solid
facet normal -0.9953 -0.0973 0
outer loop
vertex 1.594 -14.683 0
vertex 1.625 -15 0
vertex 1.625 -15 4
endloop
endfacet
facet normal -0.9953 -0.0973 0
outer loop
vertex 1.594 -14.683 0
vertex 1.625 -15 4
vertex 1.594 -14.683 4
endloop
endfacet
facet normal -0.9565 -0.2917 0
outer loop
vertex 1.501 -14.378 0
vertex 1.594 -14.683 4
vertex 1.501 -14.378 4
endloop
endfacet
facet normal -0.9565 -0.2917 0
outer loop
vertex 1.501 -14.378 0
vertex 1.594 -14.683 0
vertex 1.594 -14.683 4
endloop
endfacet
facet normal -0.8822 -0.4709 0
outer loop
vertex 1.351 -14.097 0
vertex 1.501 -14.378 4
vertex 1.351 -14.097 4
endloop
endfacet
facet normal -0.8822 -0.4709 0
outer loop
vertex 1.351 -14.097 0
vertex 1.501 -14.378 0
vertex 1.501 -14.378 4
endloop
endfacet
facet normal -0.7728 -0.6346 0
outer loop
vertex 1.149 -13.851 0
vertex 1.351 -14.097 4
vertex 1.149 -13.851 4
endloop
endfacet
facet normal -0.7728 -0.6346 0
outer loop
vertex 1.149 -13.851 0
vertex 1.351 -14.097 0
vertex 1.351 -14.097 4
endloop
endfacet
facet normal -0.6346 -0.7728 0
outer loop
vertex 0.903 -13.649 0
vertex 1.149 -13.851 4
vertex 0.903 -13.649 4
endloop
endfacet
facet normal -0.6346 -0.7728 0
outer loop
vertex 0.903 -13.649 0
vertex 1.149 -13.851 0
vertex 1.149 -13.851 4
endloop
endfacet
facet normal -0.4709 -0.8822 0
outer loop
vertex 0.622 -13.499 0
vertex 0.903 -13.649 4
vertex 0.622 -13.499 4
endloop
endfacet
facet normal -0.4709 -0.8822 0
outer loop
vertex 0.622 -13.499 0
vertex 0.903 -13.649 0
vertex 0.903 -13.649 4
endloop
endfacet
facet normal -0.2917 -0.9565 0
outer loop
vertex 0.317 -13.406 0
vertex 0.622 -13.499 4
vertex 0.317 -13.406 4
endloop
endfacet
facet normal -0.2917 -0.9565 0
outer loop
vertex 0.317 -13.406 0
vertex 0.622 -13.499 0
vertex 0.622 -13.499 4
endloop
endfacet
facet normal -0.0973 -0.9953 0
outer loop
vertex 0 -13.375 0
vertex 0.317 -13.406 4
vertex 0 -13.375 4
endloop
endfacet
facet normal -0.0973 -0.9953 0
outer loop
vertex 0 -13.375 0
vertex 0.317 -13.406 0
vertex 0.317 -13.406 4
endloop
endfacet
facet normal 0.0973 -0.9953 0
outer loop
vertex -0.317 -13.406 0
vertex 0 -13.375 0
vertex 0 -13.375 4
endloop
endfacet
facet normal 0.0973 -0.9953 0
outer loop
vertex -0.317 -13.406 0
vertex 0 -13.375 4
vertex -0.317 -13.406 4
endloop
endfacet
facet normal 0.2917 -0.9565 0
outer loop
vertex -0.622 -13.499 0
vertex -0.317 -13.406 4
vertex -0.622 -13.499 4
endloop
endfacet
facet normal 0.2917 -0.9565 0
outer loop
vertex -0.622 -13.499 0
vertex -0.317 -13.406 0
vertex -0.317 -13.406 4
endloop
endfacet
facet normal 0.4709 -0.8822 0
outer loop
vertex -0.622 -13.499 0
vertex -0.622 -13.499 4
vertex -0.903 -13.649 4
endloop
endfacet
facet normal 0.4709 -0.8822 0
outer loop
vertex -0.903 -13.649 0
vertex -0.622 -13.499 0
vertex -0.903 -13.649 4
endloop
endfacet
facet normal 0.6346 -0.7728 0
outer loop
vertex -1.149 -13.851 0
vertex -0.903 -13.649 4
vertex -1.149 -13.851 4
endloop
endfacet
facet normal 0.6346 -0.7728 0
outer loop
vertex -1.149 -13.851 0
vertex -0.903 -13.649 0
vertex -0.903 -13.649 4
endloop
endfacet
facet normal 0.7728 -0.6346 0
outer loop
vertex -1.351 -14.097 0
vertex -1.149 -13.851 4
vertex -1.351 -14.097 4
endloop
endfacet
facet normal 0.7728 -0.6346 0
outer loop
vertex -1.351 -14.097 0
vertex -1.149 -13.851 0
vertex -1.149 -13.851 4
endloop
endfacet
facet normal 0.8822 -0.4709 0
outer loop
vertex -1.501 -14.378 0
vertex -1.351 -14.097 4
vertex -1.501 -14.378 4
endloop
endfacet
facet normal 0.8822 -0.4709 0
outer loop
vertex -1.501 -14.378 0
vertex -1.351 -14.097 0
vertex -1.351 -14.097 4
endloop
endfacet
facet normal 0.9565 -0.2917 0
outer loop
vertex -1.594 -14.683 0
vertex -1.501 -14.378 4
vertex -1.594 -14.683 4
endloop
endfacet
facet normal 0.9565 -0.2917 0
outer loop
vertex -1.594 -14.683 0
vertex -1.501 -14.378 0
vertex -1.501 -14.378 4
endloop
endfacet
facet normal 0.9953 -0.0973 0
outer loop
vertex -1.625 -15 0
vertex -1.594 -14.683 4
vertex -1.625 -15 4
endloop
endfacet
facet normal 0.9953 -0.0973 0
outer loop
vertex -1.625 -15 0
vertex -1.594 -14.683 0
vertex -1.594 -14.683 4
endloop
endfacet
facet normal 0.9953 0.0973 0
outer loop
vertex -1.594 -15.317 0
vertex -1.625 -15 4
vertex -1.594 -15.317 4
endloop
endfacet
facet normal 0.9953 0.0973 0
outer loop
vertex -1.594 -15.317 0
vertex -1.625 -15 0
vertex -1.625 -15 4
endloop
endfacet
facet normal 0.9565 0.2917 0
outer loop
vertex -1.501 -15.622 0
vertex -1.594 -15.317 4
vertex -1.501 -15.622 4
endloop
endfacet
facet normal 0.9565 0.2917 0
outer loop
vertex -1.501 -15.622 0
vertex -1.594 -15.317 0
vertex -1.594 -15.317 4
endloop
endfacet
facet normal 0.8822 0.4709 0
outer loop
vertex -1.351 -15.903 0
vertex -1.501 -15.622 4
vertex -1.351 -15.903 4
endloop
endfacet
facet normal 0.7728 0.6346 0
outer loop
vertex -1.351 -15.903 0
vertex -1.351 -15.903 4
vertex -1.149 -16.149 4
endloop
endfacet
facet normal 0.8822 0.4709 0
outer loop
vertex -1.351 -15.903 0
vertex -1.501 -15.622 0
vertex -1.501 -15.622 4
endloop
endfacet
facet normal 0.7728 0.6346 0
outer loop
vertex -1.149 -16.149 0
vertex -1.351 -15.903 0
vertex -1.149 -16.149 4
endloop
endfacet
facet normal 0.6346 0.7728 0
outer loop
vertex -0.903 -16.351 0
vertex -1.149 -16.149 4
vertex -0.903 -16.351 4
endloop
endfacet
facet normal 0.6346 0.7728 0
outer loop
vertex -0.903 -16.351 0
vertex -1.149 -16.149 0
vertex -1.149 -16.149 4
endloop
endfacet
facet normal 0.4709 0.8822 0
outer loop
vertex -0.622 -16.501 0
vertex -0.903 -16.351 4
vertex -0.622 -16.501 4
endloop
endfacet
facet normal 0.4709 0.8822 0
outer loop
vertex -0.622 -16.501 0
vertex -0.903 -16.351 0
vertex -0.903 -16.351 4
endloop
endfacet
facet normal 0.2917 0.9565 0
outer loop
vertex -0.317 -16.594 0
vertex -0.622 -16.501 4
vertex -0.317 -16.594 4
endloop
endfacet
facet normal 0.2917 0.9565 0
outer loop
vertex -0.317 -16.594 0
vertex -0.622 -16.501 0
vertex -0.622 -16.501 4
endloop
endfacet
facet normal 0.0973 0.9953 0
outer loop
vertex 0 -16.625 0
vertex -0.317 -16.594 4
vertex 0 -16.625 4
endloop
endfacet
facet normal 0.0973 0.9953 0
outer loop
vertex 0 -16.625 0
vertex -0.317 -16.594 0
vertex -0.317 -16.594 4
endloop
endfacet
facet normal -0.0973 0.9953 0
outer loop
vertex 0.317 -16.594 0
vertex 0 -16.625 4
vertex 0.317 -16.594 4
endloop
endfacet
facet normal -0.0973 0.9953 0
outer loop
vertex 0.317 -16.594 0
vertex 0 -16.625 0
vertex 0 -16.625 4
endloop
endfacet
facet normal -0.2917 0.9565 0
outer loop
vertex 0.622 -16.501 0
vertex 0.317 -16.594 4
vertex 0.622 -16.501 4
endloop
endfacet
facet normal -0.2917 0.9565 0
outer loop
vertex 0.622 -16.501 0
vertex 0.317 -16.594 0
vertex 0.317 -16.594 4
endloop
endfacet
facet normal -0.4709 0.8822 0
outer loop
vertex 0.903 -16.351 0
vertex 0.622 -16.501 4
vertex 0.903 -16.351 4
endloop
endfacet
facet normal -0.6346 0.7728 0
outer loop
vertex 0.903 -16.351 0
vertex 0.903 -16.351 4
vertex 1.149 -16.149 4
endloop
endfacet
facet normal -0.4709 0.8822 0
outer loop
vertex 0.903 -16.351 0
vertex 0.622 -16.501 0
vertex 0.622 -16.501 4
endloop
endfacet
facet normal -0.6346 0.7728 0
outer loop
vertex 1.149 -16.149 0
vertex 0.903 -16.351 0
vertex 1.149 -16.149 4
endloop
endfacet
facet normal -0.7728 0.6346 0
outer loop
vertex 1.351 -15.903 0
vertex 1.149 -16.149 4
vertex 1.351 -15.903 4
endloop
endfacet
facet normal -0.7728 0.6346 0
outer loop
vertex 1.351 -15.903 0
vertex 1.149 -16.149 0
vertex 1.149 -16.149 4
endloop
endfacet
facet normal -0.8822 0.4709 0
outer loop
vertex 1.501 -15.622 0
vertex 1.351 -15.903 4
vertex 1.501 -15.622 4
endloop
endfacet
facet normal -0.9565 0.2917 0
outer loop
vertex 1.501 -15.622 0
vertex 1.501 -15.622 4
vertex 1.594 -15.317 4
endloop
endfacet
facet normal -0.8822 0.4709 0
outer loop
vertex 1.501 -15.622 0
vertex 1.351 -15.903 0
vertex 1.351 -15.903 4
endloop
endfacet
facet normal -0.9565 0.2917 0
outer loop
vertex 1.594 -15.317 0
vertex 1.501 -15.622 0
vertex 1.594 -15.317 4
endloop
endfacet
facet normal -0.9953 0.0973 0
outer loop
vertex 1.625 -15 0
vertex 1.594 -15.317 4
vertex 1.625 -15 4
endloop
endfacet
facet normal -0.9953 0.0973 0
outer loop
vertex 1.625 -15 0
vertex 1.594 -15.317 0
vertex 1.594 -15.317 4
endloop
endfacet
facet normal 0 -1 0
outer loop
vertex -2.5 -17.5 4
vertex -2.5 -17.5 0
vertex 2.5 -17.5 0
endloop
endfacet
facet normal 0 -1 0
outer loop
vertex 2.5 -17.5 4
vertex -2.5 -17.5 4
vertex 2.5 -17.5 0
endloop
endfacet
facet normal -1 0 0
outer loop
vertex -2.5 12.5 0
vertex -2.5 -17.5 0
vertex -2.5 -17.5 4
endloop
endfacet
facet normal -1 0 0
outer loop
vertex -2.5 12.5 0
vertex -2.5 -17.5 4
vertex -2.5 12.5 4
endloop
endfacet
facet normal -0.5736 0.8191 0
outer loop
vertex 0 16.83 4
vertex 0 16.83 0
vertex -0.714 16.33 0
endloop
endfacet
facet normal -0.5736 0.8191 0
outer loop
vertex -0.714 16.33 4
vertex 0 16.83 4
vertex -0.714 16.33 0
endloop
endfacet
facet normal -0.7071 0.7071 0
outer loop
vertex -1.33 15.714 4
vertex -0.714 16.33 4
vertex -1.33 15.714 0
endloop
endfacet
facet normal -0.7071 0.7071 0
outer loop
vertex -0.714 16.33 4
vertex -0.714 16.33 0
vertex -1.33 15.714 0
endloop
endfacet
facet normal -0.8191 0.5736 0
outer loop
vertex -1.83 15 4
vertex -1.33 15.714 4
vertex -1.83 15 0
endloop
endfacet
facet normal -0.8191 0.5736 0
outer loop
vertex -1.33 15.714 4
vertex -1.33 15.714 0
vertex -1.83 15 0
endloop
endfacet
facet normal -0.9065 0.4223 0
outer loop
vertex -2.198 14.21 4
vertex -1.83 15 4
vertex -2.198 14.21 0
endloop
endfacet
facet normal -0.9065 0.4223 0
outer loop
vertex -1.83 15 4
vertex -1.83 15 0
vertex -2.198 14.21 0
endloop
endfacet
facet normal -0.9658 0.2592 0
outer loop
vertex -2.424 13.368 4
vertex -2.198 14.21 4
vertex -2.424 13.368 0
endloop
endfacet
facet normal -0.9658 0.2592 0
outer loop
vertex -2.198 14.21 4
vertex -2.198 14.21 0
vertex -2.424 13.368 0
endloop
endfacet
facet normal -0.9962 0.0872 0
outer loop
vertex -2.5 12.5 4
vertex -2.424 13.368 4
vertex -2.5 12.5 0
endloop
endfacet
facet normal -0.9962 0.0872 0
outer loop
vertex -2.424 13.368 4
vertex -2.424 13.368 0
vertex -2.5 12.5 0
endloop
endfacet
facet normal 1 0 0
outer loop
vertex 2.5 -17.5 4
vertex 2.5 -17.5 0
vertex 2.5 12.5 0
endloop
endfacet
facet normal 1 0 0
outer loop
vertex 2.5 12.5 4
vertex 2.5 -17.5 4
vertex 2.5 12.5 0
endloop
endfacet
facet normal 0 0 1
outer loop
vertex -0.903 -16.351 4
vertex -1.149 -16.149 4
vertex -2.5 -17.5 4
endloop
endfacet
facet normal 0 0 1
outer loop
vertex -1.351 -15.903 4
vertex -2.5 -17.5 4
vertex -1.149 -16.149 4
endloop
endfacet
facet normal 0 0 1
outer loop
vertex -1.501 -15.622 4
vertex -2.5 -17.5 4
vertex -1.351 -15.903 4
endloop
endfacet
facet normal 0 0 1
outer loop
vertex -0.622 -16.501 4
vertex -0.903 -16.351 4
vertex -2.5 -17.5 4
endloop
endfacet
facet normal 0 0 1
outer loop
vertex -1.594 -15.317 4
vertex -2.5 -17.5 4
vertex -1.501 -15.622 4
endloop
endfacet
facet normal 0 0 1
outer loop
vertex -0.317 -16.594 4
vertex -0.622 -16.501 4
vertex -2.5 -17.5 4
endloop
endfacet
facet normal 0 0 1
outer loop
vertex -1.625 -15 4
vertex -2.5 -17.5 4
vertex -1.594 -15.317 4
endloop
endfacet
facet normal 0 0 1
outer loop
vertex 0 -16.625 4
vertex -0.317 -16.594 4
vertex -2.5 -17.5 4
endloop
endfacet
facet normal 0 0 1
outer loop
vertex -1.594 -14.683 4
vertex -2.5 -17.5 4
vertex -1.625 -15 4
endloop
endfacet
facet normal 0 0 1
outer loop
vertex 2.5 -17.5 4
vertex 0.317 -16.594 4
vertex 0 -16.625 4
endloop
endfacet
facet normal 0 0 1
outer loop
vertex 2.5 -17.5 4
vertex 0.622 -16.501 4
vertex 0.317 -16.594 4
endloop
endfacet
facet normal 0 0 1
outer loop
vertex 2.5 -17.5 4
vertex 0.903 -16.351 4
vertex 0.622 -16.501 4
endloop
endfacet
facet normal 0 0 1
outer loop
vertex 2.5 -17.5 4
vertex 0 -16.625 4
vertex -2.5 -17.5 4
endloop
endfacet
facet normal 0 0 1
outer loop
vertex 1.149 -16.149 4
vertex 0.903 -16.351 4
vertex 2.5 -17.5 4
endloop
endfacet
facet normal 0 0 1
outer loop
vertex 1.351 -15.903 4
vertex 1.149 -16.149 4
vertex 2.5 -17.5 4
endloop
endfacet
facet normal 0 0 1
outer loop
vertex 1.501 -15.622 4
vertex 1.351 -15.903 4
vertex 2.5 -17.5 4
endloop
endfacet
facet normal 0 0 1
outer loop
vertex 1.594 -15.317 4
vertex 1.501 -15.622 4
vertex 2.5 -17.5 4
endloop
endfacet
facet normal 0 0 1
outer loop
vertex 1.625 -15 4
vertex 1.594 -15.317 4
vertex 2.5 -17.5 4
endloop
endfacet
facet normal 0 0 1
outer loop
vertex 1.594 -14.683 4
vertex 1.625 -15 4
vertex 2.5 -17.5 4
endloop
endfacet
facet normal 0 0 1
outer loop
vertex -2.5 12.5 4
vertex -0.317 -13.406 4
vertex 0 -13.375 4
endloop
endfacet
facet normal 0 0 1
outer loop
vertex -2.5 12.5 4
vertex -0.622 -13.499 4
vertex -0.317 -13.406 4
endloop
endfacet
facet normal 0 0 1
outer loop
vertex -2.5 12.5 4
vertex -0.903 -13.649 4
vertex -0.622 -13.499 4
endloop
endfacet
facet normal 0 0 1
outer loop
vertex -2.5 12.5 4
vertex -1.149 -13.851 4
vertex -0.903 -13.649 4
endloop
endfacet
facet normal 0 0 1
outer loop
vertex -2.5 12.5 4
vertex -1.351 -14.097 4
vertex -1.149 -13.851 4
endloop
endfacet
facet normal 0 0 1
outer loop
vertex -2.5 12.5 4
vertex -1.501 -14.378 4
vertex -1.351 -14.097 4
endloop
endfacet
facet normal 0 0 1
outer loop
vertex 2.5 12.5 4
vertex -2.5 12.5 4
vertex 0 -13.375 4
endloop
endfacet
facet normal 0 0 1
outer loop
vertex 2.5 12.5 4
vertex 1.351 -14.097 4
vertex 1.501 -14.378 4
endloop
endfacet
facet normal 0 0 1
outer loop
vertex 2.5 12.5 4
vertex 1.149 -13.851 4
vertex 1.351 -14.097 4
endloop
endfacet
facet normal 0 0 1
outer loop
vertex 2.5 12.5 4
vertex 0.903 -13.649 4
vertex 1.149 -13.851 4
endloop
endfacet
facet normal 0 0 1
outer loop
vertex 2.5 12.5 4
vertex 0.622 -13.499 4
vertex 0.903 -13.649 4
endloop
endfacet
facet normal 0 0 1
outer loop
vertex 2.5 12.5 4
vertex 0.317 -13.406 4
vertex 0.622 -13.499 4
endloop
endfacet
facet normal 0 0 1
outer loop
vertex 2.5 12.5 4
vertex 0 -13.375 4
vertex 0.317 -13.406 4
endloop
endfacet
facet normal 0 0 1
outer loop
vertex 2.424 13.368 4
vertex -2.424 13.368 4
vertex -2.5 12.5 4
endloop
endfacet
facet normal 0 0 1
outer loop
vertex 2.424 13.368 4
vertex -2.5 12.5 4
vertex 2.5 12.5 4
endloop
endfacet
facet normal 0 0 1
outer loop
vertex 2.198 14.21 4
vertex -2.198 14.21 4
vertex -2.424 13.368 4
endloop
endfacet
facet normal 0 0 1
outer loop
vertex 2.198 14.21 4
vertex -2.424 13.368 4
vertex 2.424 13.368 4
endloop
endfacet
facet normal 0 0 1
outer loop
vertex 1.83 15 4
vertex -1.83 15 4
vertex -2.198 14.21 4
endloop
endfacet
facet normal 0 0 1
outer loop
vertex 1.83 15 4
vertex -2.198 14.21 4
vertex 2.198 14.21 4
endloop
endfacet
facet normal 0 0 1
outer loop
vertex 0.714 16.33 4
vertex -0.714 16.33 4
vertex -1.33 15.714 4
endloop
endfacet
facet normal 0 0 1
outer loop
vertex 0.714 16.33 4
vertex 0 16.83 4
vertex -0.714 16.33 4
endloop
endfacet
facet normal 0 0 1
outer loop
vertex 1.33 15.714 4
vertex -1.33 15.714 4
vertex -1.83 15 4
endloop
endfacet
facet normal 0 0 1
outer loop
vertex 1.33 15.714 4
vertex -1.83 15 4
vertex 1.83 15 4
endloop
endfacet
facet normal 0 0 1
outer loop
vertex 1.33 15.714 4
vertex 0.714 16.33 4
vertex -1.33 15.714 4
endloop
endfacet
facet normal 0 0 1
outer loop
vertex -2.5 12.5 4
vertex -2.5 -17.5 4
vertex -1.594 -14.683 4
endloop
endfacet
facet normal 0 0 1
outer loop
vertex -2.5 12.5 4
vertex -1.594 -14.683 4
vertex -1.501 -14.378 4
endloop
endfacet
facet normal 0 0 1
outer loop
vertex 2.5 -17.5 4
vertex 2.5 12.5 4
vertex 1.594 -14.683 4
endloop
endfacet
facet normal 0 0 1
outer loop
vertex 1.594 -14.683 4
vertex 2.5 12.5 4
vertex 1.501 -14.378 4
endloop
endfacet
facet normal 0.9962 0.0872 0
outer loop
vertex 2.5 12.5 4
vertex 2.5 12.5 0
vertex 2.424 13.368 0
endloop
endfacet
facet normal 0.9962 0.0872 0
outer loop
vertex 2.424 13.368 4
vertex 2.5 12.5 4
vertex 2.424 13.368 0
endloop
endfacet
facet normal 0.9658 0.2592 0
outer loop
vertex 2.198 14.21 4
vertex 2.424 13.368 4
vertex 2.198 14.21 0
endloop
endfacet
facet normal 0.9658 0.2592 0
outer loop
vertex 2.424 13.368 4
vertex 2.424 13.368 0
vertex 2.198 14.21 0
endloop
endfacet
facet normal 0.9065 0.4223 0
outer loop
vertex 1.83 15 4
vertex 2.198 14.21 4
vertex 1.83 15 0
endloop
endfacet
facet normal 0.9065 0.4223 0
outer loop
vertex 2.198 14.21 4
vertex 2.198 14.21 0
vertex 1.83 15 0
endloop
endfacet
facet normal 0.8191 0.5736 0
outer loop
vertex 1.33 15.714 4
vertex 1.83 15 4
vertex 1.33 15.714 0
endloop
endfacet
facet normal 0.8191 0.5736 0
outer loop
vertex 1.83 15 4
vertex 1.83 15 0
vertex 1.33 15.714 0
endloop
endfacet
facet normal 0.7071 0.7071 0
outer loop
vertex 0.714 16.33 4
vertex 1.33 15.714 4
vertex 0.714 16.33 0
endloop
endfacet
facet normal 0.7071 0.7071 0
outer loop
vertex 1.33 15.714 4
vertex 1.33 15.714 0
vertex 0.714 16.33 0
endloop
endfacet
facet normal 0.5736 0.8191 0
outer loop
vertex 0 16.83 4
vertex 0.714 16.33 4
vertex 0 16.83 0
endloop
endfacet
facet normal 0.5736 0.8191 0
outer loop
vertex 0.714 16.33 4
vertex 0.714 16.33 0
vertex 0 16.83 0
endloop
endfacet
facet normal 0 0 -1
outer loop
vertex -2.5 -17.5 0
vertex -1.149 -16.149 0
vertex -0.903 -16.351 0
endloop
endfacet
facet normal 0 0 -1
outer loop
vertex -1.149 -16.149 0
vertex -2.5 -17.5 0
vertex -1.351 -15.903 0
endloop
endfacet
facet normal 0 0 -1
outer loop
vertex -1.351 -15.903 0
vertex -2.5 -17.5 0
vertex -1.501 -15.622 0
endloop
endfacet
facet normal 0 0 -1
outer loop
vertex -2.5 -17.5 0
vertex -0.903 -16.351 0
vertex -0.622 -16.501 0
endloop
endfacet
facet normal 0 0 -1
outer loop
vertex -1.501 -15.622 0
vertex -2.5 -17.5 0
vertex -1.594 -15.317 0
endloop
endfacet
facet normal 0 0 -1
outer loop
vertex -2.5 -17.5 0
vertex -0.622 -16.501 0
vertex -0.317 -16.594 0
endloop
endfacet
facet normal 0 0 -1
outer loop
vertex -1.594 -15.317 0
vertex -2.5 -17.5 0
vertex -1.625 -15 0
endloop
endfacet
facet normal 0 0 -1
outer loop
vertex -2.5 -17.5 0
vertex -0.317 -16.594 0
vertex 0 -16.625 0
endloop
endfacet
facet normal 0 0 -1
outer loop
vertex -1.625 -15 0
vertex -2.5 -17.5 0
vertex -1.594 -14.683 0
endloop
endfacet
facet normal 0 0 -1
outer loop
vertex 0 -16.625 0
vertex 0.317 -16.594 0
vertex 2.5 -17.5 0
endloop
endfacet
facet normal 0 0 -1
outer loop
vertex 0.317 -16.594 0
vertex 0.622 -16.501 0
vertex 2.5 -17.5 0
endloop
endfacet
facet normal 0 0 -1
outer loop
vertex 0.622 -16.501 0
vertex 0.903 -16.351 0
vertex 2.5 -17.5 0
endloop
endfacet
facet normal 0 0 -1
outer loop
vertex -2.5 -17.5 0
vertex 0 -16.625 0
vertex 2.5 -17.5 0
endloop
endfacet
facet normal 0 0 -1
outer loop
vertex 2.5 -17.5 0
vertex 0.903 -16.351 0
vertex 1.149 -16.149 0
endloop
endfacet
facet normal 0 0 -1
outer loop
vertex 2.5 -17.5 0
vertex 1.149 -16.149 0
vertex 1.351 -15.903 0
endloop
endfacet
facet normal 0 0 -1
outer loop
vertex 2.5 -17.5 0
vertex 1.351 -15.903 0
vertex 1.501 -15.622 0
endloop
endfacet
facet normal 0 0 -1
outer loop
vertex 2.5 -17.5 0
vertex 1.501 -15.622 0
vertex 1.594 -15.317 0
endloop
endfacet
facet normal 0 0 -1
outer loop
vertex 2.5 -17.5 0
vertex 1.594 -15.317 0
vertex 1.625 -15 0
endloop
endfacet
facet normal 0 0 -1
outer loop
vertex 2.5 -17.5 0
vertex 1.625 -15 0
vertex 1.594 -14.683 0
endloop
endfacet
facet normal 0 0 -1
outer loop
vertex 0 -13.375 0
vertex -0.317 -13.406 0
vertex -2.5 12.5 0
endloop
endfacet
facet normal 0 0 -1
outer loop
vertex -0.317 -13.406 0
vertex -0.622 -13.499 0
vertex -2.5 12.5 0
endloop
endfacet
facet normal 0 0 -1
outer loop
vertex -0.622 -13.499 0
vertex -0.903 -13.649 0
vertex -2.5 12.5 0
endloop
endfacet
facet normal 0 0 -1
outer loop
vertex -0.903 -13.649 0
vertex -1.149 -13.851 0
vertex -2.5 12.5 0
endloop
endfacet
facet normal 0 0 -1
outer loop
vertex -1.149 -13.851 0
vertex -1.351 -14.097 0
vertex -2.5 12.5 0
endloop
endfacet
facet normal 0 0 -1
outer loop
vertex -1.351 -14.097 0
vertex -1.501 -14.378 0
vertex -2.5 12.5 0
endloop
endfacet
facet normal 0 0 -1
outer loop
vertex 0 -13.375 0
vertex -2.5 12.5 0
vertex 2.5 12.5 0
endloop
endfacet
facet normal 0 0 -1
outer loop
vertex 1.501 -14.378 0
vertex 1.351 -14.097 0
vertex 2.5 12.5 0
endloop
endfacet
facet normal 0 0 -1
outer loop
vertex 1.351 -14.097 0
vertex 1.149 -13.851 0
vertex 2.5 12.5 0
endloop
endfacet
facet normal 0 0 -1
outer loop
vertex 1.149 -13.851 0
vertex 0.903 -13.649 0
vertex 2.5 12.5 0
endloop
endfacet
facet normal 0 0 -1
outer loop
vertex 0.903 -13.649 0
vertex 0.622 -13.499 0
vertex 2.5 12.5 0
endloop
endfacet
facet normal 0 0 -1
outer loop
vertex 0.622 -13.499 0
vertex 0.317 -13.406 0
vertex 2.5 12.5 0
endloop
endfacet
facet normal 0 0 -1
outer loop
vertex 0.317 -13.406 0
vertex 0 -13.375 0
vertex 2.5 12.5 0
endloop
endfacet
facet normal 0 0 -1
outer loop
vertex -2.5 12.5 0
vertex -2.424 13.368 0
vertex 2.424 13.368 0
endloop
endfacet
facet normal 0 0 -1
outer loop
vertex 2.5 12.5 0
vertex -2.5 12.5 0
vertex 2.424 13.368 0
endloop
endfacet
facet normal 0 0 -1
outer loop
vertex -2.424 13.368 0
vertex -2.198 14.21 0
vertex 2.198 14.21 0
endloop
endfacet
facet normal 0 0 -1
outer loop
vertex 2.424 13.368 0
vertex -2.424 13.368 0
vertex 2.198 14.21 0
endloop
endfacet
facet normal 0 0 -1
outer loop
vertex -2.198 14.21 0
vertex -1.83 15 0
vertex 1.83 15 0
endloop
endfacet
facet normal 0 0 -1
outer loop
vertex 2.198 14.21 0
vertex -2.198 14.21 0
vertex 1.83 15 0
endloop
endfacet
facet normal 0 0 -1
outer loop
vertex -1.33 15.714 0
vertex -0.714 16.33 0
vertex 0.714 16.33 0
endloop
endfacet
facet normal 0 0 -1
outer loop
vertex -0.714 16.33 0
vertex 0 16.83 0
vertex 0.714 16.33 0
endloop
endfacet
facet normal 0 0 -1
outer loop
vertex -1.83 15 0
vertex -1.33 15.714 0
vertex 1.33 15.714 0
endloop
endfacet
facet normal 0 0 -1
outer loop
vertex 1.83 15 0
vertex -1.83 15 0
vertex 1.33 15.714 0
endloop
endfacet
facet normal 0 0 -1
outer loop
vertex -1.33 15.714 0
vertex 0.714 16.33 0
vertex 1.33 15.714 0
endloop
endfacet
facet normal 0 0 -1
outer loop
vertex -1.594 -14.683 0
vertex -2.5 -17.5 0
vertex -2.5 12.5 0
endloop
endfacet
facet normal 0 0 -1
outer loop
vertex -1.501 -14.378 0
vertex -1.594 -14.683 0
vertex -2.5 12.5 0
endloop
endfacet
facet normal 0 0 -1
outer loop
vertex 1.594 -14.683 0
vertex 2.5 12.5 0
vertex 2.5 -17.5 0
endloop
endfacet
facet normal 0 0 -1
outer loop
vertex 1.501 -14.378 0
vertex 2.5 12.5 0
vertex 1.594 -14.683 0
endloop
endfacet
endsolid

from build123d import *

# Parameters (mm, degrees)
SKETCH1_W           = 5
SKETCH1_H           = 35
SKETCH1_R           = 1.625
BOSS_EXTRUDE1_DEPTH = 4
FILLET1_R           = 5


with BuildPart() as part:
    # Sketch1 → Boss-Extrude1 (new body)
    with BuildSketch(Plane.XY):
        Rectangle(SKETCH1_W, SKETCH1_H)
        with Locations((0, -15)):
            Circle(SKETCH1_R, mode=Mode.SUBTRACT)
    extrude(amount=BOSS_EXTRUDE1_DEPTH)

    # Fillet1
    # the kernel refuses this fillet: 5 mm, written as the material it takes off along each edge
    with BuildSketch(Plane(origin=(-2.5, 17.5, -12.5), x_dir=(1, 0, 0), z_dir=(0, 0, 1)), Plane(origin=(2.5, 17.5, -12.5), x_dir=(0, -1, 0), z_dir=(0, 0, 1))) as fillet1_piece_1:
        with BuildLine():
            CenterArc((FILLET1_R, -FILLET1_R), FILLET1_R, 90, 90)
            Line((0, -FILLET1_R), (0, 0))
            Line((0, 0), (FILLET1_R, 0))
        make_face()
    extrude(amount=29, mode=Mode.SUBTRACT)


solid = part.part
